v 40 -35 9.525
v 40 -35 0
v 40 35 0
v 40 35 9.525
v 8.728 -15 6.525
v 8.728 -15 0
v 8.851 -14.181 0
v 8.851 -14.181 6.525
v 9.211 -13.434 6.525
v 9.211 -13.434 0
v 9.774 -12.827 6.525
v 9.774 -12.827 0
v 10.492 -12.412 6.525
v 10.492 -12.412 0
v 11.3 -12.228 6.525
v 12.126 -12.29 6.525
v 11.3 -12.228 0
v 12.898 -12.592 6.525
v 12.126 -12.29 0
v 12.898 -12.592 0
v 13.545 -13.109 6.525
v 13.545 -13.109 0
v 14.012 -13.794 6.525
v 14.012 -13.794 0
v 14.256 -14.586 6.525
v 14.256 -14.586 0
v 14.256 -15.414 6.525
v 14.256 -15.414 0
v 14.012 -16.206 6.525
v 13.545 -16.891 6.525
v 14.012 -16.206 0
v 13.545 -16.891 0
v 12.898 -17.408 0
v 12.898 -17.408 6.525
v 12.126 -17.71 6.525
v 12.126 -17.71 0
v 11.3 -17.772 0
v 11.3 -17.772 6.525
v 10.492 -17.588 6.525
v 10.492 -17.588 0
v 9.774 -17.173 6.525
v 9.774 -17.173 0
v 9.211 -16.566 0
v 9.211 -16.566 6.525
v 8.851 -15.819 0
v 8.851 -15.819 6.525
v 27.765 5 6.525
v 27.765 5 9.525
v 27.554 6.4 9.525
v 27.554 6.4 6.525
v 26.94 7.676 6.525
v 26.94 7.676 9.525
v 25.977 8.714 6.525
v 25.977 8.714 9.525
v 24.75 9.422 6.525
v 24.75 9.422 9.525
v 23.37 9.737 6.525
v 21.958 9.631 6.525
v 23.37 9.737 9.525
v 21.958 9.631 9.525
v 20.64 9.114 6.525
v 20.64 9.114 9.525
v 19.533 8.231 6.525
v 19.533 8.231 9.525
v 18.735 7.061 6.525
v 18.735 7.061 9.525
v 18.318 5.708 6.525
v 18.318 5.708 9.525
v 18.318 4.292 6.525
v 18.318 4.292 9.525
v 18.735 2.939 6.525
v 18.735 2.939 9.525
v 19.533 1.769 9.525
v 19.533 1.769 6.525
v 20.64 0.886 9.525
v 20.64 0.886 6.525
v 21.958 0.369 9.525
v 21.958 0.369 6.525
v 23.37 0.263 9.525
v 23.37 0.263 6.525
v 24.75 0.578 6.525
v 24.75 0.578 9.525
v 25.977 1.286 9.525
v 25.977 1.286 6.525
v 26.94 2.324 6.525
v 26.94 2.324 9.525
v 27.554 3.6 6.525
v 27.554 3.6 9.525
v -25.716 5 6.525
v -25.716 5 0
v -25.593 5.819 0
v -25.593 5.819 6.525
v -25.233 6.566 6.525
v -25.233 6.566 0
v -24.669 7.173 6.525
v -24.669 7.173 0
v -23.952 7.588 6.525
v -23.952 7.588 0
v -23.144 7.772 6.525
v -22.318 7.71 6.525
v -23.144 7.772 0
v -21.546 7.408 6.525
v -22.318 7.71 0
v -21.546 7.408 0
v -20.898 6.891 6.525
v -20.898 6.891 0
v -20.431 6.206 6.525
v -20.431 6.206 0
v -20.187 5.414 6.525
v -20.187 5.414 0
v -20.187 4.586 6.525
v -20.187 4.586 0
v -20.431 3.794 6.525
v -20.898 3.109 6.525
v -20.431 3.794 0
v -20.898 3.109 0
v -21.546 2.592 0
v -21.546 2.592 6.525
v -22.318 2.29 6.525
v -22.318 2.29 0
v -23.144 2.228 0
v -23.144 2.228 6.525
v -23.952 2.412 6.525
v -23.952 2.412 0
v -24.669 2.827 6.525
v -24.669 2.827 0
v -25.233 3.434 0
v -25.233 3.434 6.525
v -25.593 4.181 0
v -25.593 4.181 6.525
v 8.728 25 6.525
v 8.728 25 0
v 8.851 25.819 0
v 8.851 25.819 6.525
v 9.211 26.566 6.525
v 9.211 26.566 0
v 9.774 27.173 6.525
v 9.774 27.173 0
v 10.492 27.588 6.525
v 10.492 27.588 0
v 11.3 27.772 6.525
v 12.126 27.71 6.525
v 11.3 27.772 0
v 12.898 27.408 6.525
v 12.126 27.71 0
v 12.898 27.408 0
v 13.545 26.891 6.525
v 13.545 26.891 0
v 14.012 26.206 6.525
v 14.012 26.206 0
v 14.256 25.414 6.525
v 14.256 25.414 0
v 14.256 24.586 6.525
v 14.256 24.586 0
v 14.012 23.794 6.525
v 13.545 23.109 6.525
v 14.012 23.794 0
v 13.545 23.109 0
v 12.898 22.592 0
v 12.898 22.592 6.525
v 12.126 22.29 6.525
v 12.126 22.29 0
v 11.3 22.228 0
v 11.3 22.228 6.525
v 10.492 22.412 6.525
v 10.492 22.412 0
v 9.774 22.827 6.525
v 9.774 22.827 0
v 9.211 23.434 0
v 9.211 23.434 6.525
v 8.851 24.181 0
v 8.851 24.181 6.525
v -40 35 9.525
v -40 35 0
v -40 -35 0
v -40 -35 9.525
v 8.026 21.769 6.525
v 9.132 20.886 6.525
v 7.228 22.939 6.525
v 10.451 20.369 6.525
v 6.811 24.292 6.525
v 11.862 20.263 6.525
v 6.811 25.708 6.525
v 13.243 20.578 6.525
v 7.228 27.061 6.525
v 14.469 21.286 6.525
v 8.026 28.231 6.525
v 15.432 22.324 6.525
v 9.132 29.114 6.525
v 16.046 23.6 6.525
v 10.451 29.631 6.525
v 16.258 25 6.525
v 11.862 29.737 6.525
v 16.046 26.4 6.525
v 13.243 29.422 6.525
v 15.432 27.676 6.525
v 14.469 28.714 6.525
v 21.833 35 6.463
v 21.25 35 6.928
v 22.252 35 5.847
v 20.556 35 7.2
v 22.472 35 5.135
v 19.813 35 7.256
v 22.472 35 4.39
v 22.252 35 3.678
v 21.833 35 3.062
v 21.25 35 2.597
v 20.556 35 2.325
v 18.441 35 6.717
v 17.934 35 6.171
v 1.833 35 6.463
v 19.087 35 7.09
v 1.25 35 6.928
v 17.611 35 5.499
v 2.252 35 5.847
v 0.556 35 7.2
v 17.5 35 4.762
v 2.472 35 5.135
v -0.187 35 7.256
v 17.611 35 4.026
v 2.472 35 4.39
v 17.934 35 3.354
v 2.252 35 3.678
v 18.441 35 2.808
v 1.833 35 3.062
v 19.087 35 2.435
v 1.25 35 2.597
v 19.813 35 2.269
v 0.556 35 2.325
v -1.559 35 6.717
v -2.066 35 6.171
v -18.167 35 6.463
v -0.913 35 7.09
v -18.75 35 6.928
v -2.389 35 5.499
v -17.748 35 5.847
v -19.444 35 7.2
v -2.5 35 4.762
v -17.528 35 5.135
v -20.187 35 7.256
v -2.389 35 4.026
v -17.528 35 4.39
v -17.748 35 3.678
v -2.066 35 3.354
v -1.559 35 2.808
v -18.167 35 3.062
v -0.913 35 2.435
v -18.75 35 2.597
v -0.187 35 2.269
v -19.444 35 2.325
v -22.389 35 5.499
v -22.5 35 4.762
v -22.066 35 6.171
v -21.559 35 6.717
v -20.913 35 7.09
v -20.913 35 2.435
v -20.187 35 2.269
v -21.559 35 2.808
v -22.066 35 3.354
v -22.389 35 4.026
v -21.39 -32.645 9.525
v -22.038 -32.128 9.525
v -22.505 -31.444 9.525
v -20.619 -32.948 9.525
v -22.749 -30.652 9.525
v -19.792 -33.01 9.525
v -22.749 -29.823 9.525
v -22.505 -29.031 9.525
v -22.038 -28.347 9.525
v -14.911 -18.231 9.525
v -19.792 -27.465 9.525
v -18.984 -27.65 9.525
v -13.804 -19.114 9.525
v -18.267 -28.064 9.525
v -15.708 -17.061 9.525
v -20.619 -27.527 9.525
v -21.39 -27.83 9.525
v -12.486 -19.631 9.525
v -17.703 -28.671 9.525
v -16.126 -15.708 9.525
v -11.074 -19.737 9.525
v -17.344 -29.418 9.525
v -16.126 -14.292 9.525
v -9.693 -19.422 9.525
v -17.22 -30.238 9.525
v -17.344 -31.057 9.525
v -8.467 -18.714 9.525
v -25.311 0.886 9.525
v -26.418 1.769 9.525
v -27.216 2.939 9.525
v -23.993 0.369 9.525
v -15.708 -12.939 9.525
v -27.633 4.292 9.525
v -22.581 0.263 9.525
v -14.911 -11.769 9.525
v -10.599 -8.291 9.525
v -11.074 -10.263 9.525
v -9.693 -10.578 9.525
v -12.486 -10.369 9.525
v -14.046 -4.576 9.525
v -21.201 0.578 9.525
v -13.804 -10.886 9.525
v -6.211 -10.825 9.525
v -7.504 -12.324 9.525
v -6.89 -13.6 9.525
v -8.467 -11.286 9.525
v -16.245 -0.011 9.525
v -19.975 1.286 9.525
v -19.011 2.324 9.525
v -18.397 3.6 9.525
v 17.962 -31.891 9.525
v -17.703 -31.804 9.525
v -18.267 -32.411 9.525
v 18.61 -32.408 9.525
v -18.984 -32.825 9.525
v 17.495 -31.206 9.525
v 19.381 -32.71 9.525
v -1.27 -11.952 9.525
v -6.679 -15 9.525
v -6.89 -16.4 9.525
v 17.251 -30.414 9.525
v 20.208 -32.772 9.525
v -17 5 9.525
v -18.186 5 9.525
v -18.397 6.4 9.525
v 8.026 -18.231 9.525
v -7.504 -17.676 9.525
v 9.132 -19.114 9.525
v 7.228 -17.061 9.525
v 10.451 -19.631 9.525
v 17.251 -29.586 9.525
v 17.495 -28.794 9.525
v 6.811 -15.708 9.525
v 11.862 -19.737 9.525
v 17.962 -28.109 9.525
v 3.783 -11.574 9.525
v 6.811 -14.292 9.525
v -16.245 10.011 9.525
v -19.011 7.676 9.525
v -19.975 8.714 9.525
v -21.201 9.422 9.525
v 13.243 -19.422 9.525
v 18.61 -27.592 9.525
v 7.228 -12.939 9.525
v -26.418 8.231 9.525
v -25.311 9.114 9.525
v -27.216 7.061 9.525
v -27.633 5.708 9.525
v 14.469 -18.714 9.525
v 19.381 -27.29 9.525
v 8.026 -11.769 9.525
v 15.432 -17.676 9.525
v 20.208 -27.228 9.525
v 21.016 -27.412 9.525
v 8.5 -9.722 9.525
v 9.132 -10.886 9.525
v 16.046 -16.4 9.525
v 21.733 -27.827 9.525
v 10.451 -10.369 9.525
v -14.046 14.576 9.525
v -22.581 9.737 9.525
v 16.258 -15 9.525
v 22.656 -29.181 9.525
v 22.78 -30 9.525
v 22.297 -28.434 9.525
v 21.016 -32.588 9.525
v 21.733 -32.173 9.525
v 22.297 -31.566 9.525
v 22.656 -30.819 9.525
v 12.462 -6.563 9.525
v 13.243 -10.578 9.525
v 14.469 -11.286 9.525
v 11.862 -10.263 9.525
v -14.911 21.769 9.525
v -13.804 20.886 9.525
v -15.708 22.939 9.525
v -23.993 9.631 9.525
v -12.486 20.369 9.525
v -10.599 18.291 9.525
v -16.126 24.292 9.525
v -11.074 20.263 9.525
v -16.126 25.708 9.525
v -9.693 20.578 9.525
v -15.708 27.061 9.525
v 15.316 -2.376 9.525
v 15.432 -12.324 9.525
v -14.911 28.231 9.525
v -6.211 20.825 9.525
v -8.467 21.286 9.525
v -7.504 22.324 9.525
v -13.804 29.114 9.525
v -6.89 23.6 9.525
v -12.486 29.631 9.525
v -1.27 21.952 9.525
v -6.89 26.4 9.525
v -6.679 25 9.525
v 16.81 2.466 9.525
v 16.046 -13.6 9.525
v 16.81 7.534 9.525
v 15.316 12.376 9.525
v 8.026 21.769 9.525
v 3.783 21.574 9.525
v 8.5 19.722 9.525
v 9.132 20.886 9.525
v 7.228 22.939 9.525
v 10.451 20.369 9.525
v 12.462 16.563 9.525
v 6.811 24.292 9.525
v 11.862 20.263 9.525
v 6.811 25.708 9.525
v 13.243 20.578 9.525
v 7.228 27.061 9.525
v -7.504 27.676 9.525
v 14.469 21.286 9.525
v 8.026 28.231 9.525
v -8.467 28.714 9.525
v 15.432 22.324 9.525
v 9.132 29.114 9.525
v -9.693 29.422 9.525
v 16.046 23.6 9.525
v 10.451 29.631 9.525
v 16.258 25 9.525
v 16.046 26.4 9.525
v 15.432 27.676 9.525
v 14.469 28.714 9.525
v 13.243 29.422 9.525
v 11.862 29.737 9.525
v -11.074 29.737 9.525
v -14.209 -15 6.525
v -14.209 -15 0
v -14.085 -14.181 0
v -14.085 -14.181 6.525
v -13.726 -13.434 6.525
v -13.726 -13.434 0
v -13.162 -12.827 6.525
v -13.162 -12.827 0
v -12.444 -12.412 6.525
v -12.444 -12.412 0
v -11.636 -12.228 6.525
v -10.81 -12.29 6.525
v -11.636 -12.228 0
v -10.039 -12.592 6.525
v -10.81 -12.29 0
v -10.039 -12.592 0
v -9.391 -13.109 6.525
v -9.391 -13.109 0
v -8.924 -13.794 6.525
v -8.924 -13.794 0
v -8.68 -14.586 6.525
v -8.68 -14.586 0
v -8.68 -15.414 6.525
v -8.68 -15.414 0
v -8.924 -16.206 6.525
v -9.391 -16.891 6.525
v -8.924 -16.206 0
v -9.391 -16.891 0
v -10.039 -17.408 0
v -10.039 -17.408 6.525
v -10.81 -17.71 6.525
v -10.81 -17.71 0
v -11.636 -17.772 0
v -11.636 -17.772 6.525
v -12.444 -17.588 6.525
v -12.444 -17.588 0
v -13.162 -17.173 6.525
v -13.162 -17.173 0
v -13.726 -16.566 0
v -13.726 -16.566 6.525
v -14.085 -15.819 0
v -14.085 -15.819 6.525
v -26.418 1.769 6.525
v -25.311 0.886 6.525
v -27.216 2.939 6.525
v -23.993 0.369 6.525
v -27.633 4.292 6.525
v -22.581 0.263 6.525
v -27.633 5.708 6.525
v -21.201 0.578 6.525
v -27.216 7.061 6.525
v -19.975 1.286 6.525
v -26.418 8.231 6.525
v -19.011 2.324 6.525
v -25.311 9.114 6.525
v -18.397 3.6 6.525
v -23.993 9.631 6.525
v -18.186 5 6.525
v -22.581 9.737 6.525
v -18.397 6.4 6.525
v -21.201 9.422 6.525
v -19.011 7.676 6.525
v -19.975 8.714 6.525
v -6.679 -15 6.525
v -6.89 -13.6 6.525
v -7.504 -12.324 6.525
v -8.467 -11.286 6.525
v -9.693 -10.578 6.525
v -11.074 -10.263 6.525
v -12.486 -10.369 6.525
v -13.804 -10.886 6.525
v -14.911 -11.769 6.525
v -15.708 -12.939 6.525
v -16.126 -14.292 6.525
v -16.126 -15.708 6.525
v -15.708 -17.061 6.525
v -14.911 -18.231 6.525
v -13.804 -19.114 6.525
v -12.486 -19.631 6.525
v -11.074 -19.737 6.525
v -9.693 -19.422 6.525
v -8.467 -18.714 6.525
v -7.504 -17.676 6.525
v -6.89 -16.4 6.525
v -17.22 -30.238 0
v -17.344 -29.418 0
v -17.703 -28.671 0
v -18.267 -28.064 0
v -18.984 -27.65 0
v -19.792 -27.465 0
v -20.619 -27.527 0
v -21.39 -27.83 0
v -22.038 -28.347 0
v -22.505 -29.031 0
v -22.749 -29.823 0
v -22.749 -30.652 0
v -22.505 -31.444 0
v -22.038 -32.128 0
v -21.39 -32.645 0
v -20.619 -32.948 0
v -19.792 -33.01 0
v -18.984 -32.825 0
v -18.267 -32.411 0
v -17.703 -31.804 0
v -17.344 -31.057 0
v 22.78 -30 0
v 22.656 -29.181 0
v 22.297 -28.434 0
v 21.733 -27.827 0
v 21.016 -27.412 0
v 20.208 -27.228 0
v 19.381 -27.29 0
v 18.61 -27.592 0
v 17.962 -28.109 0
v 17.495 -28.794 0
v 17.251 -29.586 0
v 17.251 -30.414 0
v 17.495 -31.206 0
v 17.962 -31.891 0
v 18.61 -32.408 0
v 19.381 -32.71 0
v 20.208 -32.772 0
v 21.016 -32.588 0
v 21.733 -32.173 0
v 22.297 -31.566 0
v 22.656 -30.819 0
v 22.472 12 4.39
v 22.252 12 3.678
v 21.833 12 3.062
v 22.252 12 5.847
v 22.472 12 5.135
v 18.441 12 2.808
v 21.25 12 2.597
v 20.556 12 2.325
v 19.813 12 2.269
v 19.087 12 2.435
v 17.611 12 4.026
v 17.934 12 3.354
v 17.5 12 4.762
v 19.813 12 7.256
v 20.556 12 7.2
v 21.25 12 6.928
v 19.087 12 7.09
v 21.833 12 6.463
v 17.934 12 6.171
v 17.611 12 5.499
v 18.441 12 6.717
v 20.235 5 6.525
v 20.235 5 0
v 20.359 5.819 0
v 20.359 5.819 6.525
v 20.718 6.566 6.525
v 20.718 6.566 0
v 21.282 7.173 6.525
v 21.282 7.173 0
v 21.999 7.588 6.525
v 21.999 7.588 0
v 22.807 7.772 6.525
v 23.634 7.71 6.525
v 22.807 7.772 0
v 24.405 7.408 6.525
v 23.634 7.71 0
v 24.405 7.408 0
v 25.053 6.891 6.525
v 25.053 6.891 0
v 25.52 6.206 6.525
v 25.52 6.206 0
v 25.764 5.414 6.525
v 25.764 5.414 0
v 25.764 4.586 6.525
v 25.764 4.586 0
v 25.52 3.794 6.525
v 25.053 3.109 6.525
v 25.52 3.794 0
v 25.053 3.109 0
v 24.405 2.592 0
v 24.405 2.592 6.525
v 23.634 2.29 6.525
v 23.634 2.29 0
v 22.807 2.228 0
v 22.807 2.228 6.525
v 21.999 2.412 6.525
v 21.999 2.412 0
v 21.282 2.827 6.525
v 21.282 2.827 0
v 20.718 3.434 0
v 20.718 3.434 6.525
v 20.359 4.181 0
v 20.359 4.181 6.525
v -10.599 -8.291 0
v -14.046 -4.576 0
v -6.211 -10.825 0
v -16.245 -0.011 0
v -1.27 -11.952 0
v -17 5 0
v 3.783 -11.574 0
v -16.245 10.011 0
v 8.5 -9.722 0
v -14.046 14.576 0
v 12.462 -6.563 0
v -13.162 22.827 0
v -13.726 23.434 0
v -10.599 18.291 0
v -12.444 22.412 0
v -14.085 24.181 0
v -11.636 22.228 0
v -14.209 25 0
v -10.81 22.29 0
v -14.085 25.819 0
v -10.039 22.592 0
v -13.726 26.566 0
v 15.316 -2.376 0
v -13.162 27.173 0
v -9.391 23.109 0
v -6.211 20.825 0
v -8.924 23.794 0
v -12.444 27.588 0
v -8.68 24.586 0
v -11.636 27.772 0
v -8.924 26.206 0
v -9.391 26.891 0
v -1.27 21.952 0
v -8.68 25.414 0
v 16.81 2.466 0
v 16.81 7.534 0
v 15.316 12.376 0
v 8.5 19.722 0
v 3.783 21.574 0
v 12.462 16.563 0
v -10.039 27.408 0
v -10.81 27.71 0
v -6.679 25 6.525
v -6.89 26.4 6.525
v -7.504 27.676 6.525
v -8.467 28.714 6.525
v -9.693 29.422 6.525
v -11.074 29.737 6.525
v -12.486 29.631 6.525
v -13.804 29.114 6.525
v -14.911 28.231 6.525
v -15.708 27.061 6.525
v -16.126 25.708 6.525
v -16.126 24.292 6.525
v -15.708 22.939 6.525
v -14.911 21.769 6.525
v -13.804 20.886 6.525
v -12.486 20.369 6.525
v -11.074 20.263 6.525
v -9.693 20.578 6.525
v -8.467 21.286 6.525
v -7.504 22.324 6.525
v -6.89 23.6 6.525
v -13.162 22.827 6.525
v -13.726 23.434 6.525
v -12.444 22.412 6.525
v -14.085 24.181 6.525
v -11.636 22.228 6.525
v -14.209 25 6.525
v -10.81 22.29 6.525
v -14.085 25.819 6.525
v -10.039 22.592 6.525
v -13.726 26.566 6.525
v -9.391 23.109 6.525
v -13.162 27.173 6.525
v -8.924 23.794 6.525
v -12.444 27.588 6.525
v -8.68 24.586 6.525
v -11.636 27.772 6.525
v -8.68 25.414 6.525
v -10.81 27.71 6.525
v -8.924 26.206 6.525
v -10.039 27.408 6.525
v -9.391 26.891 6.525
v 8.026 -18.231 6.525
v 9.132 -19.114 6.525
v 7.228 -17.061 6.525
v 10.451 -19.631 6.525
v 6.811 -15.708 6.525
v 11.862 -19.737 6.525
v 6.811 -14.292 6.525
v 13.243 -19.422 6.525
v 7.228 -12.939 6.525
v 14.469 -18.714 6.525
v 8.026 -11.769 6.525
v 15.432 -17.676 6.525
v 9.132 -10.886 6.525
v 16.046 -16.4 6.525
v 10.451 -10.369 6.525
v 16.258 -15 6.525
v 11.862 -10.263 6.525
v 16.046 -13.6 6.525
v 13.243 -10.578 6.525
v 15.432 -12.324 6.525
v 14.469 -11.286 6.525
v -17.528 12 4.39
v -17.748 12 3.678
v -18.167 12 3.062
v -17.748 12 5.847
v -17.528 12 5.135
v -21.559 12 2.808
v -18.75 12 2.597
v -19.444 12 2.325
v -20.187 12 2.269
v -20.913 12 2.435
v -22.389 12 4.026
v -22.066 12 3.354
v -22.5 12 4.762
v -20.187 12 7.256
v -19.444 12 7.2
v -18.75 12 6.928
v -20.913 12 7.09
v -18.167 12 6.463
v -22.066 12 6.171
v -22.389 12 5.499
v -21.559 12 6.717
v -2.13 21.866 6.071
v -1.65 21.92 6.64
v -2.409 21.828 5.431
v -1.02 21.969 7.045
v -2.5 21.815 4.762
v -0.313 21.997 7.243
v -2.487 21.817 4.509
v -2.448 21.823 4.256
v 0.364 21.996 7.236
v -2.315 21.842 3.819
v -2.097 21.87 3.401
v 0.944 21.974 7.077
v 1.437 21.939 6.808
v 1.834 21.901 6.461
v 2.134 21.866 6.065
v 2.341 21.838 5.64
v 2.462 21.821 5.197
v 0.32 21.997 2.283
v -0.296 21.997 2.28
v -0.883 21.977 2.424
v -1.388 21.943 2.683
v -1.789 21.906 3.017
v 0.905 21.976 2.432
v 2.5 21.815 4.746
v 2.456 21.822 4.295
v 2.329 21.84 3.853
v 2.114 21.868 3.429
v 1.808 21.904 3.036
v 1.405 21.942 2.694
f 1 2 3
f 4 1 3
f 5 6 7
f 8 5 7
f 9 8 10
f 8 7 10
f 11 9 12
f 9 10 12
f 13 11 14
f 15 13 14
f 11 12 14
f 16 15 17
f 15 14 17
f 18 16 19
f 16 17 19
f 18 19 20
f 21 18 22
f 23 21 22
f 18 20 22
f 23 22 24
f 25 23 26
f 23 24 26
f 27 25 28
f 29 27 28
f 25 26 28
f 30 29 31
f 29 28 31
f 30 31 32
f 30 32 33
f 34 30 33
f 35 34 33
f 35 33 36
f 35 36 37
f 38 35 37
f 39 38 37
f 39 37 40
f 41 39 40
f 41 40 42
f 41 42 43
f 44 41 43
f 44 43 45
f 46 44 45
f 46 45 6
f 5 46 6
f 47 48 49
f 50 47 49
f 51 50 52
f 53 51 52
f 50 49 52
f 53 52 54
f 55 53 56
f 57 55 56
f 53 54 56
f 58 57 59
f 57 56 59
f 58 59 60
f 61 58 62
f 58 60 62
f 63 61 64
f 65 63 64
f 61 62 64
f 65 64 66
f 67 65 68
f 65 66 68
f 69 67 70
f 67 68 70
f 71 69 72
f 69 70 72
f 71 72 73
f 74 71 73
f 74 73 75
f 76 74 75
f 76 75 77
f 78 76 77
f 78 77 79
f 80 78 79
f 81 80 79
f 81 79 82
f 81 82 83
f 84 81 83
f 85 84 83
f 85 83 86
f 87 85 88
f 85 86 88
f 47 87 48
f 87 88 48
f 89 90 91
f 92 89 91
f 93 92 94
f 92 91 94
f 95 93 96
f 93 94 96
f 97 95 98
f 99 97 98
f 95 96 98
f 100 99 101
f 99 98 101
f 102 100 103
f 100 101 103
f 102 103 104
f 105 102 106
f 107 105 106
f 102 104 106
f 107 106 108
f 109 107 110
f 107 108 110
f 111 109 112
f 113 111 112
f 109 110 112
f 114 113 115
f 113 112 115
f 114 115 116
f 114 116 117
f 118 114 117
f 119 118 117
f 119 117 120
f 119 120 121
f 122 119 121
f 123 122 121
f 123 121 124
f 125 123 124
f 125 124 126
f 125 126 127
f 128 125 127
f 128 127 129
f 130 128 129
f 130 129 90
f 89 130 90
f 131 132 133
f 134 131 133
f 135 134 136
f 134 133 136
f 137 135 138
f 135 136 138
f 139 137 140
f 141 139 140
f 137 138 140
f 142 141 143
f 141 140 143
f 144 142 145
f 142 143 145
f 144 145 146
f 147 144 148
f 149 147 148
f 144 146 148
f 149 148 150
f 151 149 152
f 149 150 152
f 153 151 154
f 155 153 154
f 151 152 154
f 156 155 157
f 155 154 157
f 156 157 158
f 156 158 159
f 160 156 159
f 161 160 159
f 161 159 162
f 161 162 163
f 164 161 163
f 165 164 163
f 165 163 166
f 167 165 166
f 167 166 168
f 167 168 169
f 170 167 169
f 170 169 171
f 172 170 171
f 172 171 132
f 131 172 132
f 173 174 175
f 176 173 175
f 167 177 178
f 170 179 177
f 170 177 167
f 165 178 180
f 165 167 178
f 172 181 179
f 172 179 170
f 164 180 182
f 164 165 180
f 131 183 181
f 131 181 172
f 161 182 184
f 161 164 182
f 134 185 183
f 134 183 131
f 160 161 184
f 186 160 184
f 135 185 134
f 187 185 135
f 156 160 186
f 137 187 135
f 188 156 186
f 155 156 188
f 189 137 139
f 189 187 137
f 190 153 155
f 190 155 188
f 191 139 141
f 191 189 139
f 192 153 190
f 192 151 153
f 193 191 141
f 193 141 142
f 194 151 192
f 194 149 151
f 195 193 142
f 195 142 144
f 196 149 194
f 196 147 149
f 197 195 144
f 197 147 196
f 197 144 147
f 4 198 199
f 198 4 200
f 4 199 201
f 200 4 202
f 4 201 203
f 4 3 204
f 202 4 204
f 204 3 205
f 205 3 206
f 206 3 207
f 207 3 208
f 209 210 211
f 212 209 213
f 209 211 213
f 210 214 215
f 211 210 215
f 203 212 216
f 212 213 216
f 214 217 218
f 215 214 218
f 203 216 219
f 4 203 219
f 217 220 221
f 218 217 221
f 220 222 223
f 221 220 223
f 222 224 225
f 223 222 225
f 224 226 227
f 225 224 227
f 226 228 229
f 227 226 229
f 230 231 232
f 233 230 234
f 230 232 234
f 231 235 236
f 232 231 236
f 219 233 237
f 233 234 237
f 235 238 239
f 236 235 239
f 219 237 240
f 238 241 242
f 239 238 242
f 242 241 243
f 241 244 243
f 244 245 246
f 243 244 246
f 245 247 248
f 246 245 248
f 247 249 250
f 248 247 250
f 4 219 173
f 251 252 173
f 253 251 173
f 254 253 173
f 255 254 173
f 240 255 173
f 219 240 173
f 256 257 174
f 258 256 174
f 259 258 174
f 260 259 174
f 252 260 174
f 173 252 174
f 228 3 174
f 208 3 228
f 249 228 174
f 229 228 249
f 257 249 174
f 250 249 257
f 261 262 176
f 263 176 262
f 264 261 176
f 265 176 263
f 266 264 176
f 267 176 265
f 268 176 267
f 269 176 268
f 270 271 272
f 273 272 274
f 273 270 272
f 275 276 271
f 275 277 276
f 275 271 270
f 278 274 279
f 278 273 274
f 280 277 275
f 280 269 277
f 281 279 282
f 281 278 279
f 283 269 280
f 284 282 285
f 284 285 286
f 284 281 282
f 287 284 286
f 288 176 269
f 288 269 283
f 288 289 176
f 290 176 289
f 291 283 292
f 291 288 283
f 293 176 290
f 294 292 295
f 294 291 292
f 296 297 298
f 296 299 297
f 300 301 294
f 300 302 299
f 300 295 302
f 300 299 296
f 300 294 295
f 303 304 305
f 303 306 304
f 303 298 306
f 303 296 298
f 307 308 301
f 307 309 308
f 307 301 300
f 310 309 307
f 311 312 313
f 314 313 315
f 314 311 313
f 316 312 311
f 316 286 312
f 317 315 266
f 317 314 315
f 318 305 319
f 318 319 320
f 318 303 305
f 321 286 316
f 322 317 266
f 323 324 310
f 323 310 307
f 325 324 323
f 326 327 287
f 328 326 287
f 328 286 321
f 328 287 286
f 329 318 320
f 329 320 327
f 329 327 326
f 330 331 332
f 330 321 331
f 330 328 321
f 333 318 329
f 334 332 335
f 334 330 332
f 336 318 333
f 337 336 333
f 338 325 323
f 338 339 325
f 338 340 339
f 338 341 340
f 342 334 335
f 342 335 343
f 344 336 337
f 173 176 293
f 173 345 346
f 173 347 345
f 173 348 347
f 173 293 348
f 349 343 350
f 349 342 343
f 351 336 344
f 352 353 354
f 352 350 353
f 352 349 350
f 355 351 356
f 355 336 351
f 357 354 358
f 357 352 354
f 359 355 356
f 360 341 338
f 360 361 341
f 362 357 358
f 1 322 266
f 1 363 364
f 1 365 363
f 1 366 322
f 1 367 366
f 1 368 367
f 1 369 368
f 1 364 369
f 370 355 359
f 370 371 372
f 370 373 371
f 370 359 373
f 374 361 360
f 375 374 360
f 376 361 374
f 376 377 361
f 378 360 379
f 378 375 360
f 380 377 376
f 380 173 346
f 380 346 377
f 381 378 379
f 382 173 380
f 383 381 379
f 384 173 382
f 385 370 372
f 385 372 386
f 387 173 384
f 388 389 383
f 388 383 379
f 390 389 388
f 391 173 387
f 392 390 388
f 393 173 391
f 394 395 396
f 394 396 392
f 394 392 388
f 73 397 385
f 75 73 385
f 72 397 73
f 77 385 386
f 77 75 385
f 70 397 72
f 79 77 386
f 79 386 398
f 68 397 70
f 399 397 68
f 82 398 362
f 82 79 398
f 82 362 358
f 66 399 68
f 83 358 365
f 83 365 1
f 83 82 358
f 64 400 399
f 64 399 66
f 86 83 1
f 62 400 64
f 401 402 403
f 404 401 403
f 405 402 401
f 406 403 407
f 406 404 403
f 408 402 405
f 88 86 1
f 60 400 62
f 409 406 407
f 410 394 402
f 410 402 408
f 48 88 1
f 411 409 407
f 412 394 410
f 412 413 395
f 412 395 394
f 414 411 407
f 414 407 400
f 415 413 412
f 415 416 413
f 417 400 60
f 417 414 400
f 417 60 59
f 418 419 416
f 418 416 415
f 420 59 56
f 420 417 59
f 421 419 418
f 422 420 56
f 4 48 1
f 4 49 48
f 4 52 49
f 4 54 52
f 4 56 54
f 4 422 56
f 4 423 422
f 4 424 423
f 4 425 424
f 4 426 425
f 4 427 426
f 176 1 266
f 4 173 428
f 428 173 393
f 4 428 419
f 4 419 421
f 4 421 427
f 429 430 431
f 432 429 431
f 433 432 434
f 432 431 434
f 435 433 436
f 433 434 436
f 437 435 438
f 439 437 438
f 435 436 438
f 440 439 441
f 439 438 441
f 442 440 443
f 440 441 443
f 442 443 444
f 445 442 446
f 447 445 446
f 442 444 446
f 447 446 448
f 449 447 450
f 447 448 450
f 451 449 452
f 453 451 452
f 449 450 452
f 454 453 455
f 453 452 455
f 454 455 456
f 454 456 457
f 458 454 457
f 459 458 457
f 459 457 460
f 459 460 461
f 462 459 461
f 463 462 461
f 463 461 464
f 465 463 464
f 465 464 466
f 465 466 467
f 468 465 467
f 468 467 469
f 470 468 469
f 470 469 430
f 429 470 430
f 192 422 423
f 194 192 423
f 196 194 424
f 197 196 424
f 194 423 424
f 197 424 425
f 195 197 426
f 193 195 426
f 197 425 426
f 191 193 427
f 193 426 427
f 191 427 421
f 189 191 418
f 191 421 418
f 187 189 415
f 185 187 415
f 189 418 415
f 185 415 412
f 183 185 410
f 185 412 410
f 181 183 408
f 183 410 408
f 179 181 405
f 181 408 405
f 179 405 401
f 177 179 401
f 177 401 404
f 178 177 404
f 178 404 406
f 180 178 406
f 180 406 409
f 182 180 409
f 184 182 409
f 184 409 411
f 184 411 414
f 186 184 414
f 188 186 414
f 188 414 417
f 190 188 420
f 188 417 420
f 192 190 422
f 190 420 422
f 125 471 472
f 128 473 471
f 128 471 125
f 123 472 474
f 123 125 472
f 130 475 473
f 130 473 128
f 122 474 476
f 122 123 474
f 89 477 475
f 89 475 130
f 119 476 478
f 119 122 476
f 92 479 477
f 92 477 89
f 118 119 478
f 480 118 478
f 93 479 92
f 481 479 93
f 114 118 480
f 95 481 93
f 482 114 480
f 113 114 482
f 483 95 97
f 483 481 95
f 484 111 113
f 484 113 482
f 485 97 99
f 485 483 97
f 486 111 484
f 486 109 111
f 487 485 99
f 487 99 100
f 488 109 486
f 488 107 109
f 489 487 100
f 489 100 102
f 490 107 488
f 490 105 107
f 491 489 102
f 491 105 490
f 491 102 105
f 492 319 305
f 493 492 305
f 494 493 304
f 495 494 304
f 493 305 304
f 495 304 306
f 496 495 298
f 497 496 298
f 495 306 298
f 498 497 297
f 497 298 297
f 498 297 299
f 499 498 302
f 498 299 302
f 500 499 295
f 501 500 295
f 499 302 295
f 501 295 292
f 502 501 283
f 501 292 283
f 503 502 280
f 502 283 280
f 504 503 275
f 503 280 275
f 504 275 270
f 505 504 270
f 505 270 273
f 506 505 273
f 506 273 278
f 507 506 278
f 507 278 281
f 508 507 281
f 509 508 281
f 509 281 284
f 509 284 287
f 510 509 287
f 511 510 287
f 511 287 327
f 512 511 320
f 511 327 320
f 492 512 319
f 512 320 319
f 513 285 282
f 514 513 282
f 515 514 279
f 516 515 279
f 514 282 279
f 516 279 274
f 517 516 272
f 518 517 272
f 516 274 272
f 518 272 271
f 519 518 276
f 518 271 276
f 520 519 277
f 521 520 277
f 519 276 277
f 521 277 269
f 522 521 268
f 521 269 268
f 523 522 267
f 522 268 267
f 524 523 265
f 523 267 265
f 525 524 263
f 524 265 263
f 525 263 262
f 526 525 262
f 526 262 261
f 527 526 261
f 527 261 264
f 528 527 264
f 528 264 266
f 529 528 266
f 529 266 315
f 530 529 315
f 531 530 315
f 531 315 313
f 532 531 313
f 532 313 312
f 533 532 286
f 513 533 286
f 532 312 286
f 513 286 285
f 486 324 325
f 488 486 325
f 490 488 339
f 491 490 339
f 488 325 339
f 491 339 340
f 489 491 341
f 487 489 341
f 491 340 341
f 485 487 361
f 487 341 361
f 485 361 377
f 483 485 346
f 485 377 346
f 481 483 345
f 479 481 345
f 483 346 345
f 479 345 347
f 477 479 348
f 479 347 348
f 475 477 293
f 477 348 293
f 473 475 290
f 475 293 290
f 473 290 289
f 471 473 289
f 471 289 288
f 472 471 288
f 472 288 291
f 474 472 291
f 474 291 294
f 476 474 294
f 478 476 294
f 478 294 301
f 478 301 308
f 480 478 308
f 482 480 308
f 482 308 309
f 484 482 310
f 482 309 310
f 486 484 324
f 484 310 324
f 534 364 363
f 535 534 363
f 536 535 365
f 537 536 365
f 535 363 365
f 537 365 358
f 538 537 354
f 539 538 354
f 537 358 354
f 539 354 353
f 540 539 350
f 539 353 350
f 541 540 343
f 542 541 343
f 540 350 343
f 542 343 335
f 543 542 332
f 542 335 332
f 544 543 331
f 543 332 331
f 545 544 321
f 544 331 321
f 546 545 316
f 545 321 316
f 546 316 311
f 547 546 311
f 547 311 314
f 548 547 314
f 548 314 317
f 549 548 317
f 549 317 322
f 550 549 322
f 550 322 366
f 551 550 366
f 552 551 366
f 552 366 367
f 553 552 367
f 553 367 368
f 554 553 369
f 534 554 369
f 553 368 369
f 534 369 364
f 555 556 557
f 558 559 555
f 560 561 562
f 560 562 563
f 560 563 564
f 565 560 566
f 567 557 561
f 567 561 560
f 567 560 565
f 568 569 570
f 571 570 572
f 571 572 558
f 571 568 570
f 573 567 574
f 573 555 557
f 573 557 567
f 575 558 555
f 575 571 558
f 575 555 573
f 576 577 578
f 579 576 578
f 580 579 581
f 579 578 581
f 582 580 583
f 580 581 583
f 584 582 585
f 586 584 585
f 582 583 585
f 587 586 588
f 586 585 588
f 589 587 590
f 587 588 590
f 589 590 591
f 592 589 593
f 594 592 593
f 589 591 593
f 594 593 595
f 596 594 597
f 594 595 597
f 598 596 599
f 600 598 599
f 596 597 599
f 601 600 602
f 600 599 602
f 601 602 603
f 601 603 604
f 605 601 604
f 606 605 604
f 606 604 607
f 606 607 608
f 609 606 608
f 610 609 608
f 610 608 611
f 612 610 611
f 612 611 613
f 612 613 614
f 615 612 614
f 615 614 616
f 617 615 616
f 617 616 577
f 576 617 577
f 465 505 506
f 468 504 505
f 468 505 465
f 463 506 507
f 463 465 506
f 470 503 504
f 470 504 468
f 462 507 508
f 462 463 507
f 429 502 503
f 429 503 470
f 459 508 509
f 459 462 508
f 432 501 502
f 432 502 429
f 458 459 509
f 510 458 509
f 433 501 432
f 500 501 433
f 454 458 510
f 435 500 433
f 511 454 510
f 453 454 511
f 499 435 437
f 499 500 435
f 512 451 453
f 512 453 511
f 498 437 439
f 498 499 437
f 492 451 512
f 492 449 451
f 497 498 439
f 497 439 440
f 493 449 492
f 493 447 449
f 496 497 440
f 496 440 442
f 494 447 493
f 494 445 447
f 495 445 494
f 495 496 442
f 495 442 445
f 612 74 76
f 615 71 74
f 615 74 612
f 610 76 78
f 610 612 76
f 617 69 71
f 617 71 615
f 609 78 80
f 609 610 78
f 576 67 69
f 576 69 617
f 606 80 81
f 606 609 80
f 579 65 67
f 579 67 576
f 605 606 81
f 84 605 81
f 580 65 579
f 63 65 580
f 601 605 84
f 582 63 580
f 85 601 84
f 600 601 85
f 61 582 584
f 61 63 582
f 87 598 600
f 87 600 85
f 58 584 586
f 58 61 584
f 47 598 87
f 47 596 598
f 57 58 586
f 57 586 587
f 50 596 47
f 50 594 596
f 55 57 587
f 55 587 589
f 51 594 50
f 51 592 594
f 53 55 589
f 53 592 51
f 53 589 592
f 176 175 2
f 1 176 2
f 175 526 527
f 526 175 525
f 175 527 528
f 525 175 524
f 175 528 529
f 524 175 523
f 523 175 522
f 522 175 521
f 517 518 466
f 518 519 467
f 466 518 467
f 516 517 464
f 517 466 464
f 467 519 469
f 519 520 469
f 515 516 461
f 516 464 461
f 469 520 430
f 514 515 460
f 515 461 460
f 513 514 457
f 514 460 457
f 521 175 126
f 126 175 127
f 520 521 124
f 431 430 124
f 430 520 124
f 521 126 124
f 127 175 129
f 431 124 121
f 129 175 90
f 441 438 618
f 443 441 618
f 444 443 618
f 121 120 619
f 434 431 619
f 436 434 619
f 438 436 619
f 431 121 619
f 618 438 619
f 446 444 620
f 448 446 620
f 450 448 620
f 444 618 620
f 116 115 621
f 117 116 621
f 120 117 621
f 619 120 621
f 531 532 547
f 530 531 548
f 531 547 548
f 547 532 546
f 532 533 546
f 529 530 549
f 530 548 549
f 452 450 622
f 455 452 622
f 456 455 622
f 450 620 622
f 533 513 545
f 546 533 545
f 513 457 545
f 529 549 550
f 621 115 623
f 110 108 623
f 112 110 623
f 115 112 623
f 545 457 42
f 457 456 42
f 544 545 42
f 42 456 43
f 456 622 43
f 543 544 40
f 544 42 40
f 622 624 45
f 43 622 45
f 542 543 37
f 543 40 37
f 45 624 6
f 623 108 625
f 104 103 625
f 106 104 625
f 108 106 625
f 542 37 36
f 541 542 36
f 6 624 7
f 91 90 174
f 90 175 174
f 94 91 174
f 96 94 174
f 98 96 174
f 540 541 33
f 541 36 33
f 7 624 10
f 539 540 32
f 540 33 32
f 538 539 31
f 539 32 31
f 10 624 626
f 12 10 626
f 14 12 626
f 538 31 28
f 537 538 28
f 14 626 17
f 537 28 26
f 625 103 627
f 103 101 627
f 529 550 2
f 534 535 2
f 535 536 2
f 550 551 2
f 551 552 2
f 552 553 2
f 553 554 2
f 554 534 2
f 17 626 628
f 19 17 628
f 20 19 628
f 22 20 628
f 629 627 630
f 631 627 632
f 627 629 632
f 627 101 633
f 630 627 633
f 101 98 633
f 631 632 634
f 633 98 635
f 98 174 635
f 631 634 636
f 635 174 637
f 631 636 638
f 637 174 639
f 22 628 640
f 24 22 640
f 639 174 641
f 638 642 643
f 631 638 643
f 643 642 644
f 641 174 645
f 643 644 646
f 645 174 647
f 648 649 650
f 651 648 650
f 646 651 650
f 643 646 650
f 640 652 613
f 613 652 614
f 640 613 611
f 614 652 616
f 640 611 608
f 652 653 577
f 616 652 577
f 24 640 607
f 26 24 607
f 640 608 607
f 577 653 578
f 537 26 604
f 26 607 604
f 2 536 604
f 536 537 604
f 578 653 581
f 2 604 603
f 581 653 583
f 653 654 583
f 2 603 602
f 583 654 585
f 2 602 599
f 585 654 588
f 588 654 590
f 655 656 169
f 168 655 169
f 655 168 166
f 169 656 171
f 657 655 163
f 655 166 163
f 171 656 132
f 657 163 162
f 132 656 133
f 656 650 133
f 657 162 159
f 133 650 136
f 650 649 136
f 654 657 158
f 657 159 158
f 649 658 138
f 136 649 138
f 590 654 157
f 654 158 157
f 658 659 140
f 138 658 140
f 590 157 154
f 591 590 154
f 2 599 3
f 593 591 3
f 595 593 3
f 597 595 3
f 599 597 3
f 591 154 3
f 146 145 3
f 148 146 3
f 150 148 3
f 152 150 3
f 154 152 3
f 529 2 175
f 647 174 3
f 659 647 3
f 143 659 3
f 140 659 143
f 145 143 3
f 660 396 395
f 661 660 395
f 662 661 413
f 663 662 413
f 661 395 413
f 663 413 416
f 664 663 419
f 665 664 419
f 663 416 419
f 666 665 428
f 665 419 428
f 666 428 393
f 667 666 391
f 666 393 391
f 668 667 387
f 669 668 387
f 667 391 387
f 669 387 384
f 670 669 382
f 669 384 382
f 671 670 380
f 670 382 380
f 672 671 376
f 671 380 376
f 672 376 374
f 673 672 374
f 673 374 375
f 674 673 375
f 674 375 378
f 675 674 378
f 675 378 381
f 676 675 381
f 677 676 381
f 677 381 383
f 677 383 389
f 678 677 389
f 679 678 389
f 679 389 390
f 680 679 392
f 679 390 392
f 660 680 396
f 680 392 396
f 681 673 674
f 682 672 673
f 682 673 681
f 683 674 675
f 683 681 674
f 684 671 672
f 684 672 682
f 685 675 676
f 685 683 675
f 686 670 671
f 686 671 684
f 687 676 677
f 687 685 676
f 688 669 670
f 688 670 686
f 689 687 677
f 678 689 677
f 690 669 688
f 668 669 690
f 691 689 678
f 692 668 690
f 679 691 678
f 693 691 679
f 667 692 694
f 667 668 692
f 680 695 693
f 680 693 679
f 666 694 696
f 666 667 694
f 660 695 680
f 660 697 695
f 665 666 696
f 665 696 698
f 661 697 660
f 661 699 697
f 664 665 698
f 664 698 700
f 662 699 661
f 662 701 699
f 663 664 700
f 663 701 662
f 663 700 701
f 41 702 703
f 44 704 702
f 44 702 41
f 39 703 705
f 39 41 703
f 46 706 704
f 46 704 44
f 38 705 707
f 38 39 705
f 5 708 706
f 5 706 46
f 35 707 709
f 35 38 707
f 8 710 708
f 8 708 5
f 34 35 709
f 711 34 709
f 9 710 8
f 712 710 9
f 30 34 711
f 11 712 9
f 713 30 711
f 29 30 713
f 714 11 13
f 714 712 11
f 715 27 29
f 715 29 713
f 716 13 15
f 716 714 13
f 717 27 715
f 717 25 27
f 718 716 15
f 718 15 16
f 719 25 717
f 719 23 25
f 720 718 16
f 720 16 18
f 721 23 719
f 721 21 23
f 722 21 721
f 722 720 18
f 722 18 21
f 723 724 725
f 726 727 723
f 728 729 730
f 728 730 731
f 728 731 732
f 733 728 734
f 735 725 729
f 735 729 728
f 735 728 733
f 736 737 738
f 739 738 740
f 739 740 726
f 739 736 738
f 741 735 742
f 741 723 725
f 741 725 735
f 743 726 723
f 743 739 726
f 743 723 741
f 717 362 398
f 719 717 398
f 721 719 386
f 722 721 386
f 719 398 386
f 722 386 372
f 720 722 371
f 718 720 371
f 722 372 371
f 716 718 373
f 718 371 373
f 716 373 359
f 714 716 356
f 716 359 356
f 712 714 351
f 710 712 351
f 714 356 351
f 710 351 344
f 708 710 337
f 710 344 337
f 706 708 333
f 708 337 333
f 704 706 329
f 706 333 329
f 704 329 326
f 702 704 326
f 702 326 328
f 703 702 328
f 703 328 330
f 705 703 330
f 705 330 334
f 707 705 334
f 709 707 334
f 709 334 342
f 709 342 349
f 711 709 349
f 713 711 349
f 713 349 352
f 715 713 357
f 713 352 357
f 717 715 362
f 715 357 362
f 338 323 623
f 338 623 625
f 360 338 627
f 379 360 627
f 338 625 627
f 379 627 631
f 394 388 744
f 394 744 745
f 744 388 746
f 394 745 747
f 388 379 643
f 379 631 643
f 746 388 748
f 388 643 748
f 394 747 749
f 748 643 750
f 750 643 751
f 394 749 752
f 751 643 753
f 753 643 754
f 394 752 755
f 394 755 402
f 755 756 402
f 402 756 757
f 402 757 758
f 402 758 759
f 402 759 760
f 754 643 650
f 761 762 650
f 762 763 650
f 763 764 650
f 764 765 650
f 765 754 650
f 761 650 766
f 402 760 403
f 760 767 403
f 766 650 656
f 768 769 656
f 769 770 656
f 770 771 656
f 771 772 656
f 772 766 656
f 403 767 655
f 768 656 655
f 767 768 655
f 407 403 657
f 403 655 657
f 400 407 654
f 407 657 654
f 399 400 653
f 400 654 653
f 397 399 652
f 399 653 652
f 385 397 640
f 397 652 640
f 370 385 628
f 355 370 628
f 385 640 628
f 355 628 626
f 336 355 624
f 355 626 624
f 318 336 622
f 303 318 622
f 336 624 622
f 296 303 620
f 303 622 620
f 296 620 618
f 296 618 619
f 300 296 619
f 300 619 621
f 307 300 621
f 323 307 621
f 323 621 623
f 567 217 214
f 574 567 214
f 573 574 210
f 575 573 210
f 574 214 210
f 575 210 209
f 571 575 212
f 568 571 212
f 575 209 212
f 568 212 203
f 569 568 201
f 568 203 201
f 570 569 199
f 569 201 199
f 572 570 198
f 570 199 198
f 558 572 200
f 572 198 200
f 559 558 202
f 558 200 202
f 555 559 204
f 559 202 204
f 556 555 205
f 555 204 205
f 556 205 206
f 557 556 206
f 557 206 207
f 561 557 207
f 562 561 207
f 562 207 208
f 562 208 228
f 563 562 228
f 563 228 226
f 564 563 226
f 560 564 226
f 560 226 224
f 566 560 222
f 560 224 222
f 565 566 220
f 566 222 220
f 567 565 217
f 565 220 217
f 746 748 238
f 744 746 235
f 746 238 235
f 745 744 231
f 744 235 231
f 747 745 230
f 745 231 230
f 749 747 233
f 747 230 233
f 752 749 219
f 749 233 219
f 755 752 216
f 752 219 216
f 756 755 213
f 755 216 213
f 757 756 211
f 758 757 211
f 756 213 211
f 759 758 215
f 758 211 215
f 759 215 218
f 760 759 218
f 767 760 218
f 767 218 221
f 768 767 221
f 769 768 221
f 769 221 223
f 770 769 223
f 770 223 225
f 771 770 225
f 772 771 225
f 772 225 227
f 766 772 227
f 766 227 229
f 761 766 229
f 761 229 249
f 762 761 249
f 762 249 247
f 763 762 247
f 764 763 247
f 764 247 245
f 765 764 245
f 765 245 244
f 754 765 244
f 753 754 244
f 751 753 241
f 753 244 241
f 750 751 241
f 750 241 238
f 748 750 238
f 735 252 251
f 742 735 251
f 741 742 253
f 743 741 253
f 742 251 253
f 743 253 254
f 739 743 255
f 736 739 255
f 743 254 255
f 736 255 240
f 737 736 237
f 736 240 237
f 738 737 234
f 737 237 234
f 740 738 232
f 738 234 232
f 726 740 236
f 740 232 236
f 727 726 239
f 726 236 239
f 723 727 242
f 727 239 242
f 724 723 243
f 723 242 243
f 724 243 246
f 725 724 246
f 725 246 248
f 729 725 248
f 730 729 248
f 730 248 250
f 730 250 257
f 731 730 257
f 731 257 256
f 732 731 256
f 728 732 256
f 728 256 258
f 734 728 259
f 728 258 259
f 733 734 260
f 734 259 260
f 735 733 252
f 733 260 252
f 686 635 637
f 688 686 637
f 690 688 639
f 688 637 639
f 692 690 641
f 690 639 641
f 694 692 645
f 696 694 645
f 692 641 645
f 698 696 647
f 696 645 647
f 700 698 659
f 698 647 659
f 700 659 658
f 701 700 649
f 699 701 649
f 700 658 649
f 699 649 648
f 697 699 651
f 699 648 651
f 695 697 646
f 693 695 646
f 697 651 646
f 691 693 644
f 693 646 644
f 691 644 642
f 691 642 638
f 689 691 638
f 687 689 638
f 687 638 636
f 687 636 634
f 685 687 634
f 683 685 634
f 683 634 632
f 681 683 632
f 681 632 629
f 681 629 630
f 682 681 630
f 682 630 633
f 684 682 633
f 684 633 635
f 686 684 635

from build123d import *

# Parameters (mm, degrees)
RESSALTO_EXTRUS_O1_DEPTH = 9.525
ESBO_O3_R                = 2.5
CORTE_EXTRUS_O1_DEPTH    = 23
ESBO_O11_R               = 2.78
CORTE_EXTRUS_O4_DEPTH    = 9.525
ESBO_O13_R               = 17
CORTE_EXTRUS_O5_DEPTH    = 10
ESBO_O14_R               = 2.78
CORTE_EXTRUS_O6_DEPTH    = 9.525
ESBO_O16_R               = 4.75
CORTE_EXTRUS_O9_DEPTH    = 3


with BuildPart() as part:
    # Esboço2 → Ressalto-extrusão1 (new body)
    with BuildSketch(Plane.XY):
        Polygon((-40, 35), (-40, 0), (-40, -35), (40, -35), (40, 0), (40, 35), align=None)
    extrude(amount=RESSALTO_EXTRUS_O1_DEPTH)

    # Esboço3 → Corte-extrusão1 (cut)
    with BuildSketch(Plane(origin=(0, 35, 0), x_dir=(-1, 0, 0), z_dir=(0, 1, 0))):
        with Locations((20, 4.7625)):
            Circle(ESBO_O3_R)
        with Locations((0, 4.7625)):
            Circle(ESBO_O3_R)
        with Locations((-20, 4.7625)):
            Circle(ESBO_O3_R)
    extrude(amount=-CORTE_EXTRUS_O1_DEPTH, mode=Mode.SUBTRACT)

    # Esboço11 → Corte-extrusão4 (cut)
    with BuildSketch(Plane.XY.offset(9.525)):
        with Locations((-20, -30.2375)):
            Circle(ESBO_O11_R)
        with Locations((20, -30)):
            Circle(ESBO_O11_R)
    extrude(amount=-CORTE_EXTRUS_O4_DEPTH, mode=Mode.SUBTRACT)

    # Esboço13 → Corte-extrusão5 (cut)
    with BuildSketch(Plane(origin=(0, 0, 0), x_dir=(-1, 0, 0), z_dir=(0, 0, -1))):
        with Locations((0, 5)):
            Circle(ESBO_O13_R)
    extrude(amount=-CORTE_EXTRUS_O5_DEPTH, mode=Mode.SUBTRACT)

    # Esboço14 → Corte-extrusão6 (cut)
    with BuildSketch(Plane(origin=(0, 0, 0), x_dir=(-1, 0, 0), z_dir=(0, 0, -1))):
        with Locations((-23.015, 5)):
            Circle(ESBO_O14_R)
        with Locations((-11.5075, -15)):
            Circle(ESBO_O14_R)
        with Locations((-11.5075, 25)):
            Circle(ESBO_O14_R)
        with Locations((11.428624391, 25)):
            Circle(ESBO_O14_R)
        with Locations((22.936124391, 5)):
            Circle(ESBO_O14_R)
        with Locations((11.428624391, -15)):
            Circle(ESBO_O14_R)
    extrude(amount=-CORTE_EXTRUS_O6_DEPTH, mode=Mode.SUBTRACT)

    # Esboço16 → Corte-extrusão9 (cut)
    with BuildSketch(Plane.XY.offset(9.525)):
        with Locations((-22.936124391, 5)):
            Circle(ESBO_O16_R)
        with Locations((-11.428624391, 25)):
            Circle(ESBO_O16_R)
        with Locations((11.5075, 25)):
            Circle(ESBO_O16_R)
        with Locations((23.015, 5)):
            Circle(ESBO_O16_R)
        with Locations((11.5075, -15)):
            Circle(ESBO_O16_R)
        with Locations((-11.428624391, -15)):
            Circle(ESBO_O16_R)
    extrude(amount=-CORTE_EXTRUS_O9_DEPTH, mode=Mode.SUBTRACT)


solid = part.part
